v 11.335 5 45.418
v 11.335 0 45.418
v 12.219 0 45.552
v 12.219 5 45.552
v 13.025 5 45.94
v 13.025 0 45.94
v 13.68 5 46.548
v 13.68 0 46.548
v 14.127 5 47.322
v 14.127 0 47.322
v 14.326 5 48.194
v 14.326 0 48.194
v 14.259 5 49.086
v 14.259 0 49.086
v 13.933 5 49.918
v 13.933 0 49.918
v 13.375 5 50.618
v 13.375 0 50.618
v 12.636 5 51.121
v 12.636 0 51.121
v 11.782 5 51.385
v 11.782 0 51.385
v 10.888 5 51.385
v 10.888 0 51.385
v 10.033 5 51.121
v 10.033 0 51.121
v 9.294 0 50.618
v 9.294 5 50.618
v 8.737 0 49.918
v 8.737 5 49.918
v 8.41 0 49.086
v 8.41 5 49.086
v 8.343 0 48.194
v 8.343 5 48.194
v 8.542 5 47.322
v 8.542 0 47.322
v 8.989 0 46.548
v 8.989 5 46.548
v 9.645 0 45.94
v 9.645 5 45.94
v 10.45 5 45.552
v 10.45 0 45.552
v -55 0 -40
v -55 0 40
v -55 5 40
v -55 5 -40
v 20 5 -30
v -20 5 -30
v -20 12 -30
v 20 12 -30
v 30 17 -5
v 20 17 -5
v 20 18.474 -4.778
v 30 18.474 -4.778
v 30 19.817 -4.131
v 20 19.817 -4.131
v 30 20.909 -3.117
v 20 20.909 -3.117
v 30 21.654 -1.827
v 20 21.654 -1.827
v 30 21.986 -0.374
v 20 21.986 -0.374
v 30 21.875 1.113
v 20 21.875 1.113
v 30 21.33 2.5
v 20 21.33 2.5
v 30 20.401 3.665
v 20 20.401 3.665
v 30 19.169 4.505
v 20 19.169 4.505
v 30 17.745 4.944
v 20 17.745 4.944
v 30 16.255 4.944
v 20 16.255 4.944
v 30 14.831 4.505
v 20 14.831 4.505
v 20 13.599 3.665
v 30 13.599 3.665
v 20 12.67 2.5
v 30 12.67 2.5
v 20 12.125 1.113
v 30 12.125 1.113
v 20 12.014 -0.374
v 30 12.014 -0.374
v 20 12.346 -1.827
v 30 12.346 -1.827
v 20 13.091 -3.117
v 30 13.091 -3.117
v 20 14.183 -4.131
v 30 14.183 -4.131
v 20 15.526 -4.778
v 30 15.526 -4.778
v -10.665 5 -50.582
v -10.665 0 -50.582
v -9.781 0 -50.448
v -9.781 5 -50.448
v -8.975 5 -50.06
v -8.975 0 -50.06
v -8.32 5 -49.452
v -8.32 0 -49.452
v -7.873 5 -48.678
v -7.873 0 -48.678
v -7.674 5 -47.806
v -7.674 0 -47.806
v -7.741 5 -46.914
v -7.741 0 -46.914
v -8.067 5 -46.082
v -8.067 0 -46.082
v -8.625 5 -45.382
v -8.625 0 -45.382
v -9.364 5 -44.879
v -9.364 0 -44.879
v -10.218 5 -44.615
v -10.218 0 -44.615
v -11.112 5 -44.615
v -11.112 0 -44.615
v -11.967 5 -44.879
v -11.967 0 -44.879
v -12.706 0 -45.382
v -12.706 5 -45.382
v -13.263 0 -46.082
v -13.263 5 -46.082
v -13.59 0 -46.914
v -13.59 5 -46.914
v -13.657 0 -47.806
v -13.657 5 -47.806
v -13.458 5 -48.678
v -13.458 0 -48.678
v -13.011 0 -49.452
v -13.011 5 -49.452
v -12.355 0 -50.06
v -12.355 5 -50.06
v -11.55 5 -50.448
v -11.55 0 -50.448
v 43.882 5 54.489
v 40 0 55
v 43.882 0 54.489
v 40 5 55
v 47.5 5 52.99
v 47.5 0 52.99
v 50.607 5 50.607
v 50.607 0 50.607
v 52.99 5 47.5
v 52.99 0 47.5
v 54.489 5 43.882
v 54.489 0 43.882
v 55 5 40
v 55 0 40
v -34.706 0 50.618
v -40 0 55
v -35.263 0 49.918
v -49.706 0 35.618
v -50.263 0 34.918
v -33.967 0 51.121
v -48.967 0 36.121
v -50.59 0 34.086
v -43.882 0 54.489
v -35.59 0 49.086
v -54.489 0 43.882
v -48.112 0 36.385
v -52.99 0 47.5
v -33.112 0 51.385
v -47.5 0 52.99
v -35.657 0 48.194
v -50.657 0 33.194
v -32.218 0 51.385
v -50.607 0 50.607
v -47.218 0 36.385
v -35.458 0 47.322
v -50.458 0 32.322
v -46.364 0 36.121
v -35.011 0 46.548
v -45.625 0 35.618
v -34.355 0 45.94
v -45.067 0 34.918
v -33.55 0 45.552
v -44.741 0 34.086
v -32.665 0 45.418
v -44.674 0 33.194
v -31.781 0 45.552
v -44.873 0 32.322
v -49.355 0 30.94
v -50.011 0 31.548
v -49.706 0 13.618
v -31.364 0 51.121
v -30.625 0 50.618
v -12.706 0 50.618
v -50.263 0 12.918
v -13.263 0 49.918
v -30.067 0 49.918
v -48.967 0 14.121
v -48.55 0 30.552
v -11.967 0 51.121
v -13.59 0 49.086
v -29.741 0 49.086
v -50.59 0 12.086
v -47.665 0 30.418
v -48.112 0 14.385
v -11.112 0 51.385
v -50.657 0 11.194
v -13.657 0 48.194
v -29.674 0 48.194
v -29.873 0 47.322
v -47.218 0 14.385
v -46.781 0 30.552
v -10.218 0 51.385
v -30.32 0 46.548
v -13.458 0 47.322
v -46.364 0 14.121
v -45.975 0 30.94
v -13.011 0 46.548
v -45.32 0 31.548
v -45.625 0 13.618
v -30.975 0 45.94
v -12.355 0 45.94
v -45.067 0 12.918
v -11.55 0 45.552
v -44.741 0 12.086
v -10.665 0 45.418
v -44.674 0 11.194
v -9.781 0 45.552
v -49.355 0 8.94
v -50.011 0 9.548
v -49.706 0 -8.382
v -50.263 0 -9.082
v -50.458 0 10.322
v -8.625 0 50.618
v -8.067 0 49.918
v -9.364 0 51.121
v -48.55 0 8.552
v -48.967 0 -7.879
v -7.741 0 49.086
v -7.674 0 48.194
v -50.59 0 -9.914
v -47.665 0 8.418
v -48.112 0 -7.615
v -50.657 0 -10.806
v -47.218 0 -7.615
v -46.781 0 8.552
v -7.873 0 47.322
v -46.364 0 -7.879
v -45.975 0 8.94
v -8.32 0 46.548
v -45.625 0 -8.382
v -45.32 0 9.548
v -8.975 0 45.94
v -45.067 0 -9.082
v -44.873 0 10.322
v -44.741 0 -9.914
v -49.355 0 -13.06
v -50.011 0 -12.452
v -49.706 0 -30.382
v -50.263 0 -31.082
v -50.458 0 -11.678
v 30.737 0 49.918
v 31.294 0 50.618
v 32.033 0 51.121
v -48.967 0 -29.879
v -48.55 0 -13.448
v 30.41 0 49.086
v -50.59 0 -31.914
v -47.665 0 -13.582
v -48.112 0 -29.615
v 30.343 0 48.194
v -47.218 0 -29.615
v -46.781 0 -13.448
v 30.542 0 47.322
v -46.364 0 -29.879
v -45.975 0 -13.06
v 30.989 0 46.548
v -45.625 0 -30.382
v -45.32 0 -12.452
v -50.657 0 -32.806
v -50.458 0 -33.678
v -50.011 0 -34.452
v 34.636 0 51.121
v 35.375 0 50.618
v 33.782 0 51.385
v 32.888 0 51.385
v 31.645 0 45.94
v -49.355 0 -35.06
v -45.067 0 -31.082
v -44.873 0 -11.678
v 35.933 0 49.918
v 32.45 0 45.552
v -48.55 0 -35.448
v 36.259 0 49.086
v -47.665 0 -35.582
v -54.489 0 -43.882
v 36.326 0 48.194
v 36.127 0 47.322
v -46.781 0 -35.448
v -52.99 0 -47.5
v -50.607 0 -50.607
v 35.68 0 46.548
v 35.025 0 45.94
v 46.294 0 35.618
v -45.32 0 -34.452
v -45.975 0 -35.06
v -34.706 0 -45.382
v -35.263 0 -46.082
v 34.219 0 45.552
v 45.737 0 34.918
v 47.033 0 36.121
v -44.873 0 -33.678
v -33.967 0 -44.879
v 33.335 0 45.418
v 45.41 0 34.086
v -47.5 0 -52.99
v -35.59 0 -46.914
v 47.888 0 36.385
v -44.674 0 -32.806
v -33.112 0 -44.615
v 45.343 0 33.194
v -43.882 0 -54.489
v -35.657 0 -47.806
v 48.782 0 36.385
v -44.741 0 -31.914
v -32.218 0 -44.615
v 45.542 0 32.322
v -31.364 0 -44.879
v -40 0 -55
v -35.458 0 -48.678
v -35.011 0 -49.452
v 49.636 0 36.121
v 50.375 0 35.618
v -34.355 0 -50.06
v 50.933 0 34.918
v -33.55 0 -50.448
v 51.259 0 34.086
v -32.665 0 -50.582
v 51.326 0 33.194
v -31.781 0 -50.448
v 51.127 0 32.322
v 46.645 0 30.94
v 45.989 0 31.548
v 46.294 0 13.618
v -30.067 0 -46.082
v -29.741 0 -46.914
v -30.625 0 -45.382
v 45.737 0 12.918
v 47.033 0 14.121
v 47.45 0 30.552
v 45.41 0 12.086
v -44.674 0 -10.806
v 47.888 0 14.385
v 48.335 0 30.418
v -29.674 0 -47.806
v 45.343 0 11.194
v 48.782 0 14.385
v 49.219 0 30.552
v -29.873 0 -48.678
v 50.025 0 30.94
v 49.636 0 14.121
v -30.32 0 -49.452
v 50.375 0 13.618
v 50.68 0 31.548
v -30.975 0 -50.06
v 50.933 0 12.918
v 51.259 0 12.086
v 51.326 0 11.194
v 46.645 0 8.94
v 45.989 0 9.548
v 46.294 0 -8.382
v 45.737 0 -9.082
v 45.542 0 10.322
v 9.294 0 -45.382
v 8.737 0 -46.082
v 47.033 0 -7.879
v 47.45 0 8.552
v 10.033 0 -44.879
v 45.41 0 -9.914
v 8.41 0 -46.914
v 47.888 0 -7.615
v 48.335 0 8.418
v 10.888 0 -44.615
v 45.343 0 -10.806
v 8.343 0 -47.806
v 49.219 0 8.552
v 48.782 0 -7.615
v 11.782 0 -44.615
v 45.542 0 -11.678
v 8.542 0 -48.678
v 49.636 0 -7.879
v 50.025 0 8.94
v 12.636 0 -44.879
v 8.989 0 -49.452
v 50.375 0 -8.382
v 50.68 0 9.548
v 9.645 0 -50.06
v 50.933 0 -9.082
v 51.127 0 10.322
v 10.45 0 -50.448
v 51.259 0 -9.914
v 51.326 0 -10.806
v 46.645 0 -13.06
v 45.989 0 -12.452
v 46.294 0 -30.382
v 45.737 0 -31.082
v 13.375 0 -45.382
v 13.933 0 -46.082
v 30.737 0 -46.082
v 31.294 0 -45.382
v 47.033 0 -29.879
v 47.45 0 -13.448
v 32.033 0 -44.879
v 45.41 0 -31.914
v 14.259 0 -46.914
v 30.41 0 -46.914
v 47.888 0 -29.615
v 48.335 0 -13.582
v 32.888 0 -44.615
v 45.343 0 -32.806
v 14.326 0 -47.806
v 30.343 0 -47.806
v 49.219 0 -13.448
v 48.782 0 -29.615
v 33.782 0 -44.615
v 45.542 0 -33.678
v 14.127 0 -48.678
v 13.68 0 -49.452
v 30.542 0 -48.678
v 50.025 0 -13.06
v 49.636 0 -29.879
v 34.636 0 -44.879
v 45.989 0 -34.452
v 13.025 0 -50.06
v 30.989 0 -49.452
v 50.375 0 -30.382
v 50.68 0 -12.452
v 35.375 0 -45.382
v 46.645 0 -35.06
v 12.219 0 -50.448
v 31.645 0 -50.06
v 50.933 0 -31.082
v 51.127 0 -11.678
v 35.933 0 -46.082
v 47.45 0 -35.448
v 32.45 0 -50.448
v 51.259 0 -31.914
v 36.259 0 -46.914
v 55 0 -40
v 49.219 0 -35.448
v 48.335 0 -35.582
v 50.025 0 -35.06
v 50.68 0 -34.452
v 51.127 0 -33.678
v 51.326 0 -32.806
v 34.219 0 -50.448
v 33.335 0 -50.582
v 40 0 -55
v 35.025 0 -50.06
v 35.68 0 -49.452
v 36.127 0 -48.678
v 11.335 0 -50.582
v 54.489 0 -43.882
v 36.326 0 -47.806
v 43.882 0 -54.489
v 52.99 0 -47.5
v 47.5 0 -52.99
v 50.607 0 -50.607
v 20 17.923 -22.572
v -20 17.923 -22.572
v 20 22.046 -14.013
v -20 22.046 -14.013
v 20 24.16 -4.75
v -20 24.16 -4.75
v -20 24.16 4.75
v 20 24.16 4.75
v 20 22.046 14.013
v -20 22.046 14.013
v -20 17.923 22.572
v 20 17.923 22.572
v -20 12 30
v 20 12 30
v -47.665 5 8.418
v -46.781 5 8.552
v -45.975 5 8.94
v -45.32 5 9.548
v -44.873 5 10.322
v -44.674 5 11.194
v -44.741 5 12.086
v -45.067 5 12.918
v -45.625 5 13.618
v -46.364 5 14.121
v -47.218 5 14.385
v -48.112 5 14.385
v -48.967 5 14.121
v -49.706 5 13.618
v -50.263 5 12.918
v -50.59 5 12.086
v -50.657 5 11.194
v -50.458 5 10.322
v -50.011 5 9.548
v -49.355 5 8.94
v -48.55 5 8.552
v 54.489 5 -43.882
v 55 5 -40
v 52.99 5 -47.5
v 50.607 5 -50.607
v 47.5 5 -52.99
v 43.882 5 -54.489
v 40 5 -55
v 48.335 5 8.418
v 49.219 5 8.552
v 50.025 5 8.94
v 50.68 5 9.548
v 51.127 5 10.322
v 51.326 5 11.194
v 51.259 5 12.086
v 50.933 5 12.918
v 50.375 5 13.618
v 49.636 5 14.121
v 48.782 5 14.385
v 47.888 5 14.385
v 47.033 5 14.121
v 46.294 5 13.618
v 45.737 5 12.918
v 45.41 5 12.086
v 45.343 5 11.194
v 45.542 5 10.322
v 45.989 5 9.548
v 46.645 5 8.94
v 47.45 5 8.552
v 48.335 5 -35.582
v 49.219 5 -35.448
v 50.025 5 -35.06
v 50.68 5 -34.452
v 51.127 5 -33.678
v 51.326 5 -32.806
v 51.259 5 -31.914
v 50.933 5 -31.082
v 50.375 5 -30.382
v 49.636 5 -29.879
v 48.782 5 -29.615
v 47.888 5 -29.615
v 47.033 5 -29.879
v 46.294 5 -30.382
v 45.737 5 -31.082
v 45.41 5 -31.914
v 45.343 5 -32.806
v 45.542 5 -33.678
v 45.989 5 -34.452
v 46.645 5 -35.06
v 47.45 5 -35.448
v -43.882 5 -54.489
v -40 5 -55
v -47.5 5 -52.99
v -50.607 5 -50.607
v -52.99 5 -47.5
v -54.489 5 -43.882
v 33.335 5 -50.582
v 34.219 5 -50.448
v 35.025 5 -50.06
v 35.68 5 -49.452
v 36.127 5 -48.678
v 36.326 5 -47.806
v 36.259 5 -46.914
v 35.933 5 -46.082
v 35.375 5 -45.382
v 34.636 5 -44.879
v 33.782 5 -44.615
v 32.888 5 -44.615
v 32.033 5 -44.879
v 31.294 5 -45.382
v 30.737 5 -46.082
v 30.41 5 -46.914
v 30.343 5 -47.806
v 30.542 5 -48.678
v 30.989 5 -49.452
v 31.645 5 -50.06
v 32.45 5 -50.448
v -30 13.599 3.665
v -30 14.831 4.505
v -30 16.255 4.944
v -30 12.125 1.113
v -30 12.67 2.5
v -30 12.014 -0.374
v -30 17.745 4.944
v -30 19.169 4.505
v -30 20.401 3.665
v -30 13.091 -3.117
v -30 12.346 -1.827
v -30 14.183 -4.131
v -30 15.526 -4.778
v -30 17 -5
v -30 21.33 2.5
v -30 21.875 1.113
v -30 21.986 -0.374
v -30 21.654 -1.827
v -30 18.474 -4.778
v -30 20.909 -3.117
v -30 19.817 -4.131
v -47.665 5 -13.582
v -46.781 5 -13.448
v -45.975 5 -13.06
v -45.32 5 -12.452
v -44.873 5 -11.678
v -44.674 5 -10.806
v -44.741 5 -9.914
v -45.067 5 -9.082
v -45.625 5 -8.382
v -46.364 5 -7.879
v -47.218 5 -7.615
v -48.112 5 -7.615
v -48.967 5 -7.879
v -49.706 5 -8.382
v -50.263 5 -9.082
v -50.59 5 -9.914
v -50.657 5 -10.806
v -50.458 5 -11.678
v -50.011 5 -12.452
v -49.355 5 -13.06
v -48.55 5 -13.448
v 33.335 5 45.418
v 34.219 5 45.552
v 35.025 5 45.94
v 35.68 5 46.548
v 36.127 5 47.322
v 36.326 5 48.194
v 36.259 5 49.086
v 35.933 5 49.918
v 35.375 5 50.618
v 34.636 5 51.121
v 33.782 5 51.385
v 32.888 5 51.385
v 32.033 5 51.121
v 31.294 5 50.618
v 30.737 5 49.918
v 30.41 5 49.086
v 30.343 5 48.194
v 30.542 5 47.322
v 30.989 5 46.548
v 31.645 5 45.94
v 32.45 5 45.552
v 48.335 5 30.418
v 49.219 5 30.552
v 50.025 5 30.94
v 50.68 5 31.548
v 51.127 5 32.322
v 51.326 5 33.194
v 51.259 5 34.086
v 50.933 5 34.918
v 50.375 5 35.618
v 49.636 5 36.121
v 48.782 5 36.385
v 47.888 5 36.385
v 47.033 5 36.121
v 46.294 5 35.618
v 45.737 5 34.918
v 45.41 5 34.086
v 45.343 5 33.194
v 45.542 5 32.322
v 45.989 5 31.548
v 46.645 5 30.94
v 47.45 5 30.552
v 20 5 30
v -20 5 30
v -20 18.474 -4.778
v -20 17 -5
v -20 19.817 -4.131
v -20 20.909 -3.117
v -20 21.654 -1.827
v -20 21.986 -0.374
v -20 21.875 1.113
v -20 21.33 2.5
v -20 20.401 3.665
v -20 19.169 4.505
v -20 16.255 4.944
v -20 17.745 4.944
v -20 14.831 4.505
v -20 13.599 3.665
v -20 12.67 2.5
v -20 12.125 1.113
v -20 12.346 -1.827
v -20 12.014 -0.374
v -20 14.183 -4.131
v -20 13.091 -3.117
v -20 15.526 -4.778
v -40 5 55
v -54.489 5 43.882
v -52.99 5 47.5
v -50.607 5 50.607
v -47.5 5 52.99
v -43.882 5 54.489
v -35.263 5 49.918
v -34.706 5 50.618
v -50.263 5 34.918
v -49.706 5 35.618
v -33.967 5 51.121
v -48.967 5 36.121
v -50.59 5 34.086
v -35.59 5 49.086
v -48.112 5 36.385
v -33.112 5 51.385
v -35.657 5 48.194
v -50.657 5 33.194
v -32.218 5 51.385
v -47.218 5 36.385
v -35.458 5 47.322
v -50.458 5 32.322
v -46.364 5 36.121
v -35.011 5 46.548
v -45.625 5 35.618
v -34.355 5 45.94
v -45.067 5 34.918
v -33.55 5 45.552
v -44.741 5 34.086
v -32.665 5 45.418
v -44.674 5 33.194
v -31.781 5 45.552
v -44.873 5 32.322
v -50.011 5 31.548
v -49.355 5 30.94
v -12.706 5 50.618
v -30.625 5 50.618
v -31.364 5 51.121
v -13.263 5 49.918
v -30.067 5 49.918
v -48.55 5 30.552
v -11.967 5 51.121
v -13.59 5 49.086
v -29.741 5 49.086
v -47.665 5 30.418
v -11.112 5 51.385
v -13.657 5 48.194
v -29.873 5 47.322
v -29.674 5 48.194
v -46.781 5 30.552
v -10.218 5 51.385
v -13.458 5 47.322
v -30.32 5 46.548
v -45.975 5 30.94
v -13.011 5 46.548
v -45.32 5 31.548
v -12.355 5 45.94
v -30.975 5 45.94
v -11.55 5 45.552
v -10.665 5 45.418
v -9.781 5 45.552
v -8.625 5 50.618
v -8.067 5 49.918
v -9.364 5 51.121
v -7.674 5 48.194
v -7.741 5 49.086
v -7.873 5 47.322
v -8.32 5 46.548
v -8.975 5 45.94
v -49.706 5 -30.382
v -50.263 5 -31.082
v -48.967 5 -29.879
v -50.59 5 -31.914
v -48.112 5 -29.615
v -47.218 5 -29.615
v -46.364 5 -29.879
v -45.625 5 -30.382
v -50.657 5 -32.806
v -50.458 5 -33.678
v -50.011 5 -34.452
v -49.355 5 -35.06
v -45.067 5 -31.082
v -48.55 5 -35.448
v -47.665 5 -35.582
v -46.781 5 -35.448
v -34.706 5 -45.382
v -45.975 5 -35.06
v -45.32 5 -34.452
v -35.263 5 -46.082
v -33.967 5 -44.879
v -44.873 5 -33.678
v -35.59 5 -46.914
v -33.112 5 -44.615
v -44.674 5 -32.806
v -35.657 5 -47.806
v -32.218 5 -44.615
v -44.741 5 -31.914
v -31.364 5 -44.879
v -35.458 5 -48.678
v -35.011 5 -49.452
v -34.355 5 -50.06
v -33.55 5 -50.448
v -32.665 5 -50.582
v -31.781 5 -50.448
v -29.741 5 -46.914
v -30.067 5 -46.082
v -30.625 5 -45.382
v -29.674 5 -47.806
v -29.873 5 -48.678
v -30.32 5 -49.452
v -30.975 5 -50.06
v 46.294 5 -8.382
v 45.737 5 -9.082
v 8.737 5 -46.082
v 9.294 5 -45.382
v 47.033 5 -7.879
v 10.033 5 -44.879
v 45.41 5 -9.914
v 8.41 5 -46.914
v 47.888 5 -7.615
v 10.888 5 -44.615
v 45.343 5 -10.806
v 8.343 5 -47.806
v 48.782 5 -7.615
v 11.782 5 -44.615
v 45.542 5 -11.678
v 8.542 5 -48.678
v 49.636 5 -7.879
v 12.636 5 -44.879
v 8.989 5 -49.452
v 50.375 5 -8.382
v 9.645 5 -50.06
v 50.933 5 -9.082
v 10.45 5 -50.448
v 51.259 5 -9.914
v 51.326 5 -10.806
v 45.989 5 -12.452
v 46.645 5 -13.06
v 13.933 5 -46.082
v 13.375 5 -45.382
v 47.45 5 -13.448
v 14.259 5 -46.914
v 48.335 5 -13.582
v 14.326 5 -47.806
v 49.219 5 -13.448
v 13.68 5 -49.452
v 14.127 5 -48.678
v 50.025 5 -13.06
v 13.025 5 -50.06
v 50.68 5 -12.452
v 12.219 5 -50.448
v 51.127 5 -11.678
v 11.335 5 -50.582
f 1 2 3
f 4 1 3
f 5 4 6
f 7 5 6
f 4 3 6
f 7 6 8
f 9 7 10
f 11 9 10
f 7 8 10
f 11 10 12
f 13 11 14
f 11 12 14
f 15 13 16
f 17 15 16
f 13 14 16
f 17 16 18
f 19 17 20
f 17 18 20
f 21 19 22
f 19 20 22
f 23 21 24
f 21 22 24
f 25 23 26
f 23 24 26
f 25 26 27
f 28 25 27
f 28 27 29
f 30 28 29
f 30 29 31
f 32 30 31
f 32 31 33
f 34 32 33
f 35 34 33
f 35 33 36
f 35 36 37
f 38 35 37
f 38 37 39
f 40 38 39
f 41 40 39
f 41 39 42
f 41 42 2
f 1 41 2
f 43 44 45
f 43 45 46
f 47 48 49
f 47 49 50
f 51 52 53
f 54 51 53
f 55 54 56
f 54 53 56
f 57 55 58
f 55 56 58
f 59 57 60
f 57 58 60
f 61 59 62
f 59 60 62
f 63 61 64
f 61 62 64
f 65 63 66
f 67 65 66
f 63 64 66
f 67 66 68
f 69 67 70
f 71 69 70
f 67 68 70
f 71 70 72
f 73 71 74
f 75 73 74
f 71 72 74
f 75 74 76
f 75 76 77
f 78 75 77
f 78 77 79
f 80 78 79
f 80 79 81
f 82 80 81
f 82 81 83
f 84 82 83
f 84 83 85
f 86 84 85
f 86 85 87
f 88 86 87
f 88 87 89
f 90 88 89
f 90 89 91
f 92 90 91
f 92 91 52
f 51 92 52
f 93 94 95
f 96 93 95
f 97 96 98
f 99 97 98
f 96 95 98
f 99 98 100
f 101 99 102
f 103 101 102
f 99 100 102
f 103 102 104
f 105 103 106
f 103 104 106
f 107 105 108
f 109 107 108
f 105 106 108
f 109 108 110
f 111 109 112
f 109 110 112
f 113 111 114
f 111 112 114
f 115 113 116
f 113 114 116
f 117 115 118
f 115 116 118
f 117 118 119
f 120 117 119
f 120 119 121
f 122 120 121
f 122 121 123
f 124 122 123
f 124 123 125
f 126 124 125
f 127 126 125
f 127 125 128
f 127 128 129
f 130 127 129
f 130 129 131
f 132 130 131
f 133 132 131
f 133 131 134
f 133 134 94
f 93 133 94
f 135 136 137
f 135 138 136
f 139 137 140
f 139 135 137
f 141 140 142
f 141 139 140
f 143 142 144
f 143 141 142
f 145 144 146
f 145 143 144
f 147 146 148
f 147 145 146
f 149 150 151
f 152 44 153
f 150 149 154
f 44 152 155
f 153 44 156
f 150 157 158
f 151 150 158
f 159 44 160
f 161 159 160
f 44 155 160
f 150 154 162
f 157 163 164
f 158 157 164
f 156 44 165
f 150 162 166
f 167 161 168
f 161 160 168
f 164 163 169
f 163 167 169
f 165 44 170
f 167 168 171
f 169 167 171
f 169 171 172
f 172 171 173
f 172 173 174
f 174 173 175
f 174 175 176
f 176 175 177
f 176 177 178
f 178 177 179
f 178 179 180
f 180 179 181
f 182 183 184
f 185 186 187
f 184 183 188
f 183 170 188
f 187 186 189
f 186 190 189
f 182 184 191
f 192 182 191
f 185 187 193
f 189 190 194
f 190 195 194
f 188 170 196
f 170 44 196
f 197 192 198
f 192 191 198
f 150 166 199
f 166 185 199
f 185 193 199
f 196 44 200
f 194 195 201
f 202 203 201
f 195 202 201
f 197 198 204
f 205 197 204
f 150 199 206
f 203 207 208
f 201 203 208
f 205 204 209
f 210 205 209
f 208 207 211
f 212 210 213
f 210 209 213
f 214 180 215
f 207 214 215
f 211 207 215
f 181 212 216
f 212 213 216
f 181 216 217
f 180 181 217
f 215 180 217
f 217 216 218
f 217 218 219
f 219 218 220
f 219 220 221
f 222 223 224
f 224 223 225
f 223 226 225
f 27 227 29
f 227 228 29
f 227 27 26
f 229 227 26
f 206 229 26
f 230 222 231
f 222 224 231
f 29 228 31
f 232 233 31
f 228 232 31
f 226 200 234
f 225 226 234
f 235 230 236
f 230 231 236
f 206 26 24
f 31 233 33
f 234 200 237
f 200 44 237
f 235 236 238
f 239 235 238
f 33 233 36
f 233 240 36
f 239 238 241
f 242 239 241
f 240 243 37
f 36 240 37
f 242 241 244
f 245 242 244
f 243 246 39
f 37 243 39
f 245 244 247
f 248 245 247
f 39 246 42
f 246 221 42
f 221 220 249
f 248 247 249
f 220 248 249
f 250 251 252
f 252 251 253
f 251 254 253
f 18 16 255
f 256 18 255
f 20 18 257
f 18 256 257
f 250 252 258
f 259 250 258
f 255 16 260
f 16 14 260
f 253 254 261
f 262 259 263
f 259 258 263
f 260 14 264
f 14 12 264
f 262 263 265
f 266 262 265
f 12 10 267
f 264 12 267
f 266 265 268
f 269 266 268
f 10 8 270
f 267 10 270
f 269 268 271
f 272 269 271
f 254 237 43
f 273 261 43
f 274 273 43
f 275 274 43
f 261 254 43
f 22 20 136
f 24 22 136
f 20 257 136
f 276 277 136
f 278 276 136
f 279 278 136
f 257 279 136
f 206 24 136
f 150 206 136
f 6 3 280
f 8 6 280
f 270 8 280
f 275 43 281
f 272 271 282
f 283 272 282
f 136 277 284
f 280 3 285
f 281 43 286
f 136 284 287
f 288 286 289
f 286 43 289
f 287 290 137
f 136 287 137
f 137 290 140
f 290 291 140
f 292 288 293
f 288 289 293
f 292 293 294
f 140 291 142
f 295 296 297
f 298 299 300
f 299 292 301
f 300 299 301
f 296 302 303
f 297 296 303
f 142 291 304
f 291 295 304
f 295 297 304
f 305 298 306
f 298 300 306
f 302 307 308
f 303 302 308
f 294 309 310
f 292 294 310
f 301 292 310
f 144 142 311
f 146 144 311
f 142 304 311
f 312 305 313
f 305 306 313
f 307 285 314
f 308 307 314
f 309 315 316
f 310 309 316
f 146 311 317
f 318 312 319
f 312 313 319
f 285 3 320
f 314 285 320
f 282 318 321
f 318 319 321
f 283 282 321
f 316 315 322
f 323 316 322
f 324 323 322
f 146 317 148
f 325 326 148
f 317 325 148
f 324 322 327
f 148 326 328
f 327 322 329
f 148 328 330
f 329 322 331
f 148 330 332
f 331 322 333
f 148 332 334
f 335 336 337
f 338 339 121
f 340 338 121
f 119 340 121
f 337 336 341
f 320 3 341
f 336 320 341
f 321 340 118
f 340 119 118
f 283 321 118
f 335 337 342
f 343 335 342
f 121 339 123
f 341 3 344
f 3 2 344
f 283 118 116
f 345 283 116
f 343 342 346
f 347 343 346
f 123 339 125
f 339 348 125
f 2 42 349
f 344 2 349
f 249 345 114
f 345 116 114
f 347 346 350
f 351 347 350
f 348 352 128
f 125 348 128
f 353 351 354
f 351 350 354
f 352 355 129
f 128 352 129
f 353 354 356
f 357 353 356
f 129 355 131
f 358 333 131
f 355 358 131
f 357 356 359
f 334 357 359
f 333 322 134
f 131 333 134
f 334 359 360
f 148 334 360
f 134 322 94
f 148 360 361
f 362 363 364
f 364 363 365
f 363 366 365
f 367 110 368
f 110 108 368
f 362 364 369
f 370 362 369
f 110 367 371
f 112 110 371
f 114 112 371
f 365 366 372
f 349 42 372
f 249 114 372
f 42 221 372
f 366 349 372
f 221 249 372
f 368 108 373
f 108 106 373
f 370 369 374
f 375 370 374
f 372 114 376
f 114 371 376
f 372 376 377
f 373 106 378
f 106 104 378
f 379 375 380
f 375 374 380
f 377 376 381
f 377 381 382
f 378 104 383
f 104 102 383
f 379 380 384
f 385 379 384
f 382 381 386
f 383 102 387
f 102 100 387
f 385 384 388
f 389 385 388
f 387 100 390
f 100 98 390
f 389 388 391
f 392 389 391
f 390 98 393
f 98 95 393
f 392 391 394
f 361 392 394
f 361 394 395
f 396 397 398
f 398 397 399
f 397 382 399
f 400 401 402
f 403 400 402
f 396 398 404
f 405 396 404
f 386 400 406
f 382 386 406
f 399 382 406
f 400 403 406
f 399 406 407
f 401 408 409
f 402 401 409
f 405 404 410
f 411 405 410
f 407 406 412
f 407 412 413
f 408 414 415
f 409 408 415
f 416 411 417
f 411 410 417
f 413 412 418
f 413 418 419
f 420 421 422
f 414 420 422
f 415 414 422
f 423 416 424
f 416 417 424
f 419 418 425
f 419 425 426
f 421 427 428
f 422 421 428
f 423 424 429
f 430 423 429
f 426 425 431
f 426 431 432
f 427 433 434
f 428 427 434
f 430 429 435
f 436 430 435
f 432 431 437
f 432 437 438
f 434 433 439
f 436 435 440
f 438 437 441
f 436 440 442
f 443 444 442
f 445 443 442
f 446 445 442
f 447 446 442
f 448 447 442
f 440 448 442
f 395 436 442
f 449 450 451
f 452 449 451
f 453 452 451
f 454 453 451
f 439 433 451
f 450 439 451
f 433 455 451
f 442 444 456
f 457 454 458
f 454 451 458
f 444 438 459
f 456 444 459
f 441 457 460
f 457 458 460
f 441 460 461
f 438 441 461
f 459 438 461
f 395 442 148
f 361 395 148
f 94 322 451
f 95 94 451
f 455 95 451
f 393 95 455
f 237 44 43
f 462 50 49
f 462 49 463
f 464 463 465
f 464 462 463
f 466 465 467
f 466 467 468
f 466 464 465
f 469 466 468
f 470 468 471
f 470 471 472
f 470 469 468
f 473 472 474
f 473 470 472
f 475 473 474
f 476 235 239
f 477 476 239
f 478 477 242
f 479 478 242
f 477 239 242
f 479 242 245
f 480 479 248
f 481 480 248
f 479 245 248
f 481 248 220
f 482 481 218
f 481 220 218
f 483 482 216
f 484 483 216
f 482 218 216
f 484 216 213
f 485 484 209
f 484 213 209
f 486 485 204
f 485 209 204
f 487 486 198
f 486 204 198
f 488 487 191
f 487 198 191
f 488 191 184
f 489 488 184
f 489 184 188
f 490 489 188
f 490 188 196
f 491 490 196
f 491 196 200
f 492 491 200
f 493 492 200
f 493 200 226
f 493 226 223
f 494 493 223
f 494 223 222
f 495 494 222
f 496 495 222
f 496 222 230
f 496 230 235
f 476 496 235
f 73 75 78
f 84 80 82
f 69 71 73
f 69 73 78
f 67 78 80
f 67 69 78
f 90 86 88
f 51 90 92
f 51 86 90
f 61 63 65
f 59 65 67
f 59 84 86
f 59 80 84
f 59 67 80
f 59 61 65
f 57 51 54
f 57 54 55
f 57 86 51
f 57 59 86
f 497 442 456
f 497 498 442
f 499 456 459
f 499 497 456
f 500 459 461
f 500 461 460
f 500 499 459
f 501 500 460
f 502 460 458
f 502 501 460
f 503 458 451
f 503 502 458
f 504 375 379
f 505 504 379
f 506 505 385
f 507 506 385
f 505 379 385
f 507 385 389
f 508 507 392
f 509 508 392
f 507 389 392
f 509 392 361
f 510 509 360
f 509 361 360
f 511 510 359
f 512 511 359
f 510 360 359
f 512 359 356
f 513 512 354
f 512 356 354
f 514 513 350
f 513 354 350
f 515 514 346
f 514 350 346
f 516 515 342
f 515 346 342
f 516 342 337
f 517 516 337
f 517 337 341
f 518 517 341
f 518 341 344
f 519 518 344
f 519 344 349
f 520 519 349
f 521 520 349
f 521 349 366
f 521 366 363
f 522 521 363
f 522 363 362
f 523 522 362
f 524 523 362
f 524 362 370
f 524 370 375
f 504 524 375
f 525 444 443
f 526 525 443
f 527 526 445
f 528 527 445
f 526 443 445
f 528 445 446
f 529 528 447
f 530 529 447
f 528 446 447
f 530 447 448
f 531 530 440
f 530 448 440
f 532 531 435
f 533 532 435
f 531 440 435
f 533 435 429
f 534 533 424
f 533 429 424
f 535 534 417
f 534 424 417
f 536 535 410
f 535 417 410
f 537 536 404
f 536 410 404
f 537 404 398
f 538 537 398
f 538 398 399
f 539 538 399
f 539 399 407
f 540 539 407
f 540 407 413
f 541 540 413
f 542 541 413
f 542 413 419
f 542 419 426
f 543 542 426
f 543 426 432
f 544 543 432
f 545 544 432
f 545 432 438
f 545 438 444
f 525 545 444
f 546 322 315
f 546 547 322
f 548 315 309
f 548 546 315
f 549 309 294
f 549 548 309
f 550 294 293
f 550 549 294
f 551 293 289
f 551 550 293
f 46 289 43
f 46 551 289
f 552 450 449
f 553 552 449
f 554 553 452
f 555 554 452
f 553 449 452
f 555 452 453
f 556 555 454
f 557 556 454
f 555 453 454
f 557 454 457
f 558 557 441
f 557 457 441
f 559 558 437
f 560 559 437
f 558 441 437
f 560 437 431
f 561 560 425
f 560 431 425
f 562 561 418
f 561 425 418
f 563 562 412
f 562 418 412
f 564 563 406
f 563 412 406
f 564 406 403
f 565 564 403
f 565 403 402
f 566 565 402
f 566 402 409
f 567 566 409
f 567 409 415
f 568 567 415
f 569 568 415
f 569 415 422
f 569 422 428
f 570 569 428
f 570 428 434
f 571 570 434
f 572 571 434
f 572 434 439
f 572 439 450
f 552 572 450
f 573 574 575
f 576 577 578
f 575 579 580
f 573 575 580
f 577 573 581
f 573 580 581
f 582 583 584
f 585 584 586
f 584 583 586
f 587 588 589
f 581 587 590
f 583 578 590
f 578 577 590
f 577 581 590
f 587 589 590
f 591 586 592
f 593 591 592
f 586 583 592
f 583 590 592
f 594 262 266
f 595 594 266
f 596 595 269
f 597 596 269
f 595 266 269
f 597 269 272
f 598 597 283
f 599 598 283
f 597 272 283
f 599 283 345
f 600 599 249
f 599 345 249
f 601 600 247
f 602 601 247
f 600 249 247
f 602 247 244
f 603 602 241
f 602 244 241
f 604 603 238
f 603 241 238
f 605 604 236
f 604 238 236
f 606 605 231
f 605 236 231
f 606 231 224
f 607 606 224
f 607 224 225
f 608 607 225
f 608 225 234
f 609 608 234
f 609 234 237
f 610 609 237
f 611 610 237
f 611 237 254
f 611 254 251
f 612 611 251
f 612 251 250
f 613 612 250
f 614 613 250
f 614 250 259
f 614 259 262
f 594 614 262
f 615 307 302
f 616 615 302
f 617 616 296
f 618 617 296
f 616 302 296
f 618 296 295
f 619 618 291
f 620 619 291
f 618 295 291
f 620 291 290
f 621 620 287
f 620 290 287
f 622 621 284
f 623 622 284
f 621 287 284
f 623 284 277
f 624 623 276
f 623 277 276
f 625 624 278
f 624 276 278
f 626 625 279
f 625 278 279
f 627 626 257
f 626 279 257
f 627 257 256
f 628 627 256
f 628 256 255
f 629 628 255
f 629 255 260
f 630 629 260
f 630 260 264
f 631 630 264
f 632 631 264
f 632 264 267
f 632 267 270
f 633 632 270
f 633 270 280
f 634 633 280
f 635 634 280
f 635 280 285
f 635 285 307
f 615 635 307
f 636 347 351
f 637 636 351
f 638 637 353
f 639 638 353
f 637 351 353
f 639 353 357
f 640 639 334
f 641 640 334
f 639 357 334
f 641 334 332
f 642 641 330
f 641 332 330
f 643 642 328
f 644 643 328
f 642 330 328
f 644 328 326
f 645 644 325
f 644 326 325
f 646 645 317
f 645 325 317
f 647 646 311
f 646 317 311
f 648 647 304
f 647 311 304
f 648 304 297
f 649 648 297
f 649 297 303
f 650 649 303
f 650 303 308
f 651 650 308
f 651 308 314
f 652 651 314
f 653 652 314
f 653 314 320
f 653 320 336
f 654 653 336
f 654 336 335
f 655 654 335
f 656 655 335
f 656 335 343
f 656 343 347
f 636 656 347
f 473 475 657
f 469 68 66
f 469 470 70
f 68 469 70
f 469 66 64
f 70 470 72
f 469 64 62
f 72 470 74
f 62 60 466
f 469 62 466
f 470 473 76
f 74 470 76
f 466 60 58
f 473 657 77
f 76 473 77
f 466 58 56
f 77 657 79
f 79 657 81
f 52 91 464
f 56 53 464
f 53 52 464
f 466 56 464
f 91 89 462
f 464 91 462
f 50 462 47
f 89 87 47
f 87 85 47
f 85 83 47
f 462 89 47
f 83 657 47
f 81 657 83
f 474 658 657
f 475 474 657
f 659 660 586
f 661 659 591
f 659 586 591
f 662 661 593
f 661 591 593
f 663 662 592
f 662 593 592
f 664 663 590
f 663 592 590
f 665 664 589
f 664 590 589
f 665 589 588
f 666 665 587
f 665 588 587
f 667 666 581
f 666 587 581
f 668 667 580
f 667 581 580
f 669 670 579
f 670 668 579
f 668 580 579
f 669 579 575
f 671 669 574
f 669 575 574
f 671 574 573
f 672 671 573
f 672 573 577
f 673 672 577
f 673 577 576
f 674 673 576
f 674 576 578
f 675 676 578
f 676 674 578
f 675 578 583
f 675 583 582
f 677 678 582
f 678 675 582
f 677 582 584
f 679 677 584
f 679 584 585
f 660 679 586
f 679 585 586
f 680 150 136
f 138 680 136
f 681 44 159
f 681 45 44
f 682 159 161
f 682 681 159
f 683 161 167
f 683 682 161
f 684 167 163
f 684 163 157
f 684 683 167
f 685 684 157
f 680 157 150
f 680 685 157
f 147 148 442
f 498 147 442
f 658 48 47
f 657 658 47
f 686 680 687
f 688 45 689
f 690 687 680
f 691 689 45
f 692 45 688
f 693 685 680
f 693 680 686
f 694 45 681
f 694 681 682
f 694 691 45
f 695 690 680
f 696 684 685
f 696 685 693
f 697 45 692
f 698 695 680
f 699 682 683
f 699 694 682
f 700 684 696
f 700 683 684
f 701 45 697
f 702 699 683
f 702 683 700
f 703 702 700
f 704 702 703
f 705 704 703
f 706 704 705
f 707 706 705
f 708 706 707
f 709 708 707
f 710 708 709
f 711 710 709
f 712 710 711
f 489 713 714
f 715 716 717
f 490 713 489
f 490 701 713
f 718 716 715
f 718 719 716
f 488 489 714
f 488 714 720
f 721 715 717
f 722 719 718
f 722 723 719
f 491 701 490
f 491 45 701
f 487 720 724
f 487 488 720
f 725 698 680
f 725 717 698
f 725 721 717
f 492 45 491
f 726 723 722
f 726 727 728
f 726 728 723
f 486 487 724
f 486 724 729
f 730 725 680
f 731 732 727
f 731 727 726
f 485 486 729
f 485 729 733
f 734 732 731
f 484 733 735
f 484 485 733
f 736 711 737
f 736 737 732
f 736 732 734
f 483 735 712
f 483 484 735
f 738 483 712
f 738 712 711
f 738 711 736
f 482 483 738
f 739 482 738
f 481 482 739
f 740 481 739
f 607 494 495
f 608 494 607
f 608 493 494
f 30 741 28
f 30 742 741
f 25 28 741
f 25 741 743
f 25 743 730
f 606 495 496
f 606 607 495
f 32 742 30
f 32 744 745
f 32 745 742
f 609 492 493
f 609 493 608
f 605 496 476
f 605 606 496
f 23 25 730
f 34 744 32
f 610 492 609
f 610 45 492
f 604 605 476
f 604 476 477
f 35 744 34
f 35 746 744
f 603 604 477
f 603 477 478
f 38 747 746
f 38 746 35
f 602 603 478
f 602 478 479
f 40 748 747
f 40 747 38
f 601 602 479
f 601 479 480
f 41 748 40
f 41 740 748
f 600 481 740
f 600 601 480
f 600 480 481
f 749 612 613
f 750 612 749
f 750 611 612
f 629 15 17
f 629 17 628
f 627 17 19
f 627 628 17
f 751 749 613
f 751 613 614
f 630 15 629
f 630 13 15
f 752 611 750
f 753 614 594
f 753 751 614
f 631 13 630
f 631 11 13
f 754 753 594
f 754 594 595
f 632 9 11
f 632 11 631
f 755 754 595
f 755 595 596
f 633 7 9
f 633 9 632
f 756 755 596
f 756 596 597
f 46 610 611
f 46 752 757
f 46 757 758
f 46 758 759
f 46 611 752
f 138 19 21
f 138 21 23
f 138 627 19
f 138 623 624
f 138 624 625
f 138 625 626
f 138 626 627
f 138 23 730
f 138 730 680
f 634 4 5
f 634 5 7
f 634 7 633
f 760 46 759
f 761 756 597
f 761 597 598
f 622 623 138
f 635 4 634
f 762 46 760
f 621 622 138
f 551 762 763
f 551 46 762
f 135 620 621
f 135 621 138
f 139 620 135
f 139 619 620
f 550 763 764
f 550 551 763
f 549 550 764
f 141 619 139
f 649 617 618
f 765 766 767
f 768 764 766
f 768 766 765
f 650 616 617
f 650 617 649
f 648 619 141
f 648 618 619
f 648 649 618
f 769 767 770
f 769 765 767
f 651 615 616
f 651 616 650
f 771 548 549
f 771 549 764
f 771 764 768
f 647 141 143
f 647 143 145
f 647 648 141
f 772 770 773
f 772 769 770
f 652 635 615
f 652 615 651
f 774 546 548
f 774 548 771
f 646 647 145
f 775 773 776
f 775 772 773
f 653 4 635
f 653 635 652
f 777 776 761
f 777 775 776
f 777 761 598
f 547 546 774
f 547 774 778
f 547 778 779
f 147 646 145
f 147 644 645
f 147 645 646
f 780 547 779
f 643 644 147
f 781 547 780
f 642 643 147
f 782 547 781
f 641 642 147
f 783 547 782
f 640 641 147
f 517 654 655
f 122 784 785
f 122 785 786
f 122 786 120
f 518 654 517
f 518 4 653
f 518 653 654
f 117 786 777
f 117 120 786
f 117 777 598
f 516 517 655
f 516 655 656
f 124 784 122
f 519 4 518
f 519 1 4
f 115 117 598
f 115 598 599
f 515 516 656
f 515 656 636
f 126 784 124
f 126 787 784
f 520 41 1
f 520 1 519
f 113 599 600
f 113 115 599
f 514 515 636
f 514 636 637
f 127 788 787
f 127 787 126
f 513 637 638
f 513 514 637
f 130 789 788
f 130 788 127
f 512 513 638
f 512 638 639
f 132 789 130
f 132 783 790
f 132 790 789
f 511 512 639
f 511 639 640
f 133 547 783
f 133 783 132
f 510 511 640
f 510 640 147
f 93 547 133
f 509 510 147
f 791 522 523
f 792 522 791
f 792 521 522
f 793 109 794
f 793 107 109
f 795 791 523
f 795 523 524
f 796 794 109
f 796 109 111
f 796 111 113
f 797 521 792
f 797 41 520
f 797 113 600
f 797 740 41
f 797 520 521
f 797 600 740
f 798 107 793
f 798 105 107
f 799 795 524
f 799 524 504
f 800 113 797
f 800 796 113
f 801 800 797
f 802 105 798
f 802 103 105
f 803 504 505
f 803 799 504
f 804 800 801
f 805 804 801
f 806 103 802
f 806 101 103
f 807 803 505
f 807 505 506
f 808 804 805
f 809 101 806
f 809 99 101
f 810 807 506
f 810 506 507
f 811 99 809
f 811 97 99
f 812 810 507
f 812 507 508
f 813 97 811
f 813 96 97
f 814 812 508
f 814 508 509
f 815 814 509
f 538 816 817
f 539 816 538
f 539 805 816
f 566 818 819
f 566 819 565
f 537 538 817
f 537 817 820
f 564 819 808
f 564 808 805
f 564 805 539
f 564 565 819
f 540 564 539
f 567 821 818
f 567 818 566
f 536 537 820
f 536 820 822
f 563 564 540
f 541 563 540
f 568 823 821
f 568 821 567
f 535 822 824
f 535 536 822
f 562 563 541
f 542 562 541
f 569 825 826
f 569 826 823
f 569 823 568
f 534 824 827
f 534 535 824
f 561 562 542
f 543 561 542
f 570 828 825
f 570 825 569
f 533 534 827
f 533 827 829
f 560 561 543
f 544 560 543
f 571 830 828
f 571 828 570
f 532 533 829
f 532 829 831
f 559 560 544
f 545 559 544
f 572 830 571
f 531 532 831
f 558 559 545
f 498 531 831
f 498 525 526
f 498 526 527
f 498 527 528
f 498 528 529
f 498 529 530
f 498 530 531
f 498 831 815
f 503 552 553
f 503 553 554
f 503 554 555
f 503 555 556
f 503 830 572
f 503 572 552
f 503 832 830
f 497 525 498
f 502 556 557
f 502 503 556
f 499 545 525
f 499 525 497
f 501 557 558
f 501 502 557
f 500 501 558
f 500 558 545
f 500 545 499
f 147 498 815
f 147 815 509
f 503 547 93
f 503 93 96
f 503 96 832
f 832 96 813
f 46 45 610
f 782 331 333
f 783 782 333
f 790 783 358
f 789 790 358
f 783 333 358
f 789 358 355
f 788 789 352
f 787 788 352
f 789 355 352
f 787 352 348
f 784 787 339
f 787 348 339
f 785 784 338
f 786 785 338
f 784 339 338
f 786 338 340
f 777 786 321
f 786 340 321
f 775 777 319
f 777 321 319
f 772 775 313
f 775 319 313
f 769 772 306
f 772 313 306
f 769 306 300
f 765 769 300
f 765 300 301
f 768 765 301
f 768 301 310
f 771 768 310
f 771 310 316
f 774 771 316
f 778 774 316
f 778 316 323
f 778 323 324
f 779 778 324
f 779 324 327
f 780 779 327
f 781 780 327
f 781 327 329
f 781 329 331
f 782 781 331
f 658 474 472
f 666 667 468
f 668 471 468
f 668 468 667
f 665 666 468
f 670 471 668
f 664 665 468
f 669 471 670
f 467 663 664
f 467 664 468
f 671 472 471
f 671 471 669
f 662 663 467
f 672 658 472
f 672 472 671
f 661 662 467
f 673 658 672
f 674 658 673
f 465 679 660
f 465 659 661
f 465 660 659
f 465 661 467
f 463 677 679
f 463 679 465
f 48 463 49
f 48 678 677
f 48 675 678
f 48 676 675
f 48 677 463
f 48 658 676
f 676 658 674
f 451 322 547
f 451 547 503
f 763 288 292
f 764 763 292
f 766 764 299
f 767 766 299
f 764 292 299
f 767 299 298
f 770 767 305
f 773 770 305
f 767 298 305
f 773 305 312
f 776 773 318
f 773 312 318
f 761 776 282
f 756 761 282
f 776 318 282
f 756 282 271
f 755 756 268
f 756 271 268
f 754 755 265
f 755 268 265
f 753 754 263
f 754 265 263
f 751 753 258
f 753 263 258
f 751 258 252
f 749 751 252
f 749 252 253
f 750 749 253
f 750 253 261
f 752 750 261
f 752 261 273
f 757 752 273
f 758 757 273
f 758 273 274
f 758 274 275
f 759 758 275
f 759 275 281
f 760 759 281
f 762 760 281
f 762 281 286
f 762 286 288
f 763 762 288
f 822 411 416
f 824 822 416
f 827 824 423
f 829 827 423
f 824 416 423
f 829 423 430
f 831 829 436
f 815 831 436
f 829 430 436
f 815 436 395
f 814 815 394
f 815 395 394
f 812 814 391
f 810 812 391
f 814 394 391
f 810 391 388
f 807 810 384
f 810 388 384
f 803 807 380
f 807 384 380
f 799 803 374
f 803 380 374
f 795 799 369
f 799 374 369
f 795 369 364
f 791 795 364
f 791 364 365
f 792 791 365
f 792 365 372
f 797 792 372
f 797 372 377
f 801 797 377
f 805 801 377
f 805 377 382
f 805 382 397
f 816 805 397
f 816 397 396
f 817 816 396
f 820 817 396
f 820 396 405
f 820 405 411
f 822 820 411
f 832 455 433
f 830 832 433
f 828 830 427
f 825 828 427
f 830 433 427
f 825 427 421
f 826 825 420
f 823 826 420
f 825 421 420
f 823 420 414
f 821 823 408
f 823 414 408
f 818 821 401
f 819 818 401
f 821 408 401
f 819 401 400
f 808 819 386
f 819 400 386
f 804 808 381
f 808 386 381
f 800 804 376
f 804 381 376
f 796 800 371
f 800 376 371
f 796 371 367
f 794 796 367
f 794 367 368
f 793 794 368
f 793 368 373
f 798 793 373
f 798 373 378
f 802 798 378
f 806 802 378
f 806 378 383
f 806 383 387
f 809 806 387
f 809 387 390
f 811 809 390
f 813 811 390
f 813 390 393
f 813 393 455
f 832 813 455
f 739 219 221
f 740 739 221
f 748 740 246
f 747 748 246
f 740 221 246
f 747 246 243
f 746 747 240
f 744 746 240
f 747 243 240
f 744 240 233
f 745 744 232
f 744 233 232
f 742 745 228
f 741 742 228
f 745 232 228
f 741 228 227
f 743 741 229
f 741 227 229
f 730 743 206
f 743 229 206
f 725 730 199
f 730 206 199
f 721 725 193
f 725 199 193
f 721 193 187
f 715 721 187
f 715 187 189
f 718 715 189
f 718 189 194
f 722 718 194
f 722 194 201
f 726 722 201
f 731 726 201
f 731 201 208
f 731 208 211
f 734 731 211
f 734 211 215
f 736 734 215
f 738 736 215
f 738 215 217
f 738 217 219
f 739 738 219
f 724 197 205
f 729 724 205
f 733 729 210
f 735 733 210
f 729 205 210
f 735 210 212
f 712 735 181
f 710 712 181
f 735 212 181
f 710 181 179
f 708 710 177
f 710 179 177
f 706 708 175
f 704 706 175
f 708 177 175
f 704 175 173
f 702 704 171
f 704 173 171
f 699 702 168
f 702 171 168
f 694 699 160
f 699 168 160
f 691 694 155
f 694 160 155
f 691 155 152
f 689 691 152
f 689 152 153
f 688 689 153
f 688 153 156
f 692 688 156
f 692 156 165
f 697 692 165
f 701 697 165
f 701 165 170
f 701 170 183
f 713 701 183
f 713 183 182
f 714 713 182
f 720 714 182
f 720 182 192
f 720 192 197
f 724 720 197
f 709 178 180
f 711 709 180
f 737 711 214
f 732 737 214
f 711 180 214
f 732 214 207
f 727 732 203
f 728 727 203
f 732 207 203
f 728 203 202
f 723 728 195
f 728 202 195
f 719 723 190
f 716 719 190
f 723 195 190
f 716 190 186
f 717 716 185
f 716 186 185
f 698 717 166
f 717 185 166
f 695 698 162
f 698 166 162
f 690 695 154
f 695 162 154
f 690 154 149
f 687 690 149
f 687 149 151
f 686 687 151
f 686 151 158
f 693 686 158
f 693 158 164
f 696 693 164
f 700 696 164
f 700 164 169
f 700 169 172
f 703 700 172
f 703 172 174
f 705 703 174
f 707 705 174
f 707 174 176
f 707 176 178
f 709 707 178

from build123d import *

# Parameters (mm, degrees)
SKETCH1_W                = 110
SKETCH1_H                = 110
BOSS_EXTRUDE1_DEPTH      = 5
FILLET2_R                = 15
FILLET3_R                = 15
FILLET4_R                = 15
FILLET5_R                = 15
SKETCH2_W                = 40
SKETCH2_H                = 60
BOSS_EXTRUDE2_DEPTH      = 24
BOSS_EXTRUDE3_DEPTH      = 10
BOSS_EXTRUDE3_DEPTH_BACK = 50
SKETCH4_R                = 5
FILLET6_R                = 10
FILLET7_R                = 10
SKETCH5_R                = 3
CUT_EXTRUDE1_DEPTH       = 10
CUT_EXTRUDE2_DEPTH       = 60


with BuildPart() as part:
    # Sketch1 → Boss-Extrude1 (new body)
    with BuildSketch(Plane(origin=(0, 0, 0), x_dir=(1, 0, 0), z_dir=(0, 1, 0))):
        Rectangle(SKETCH1_W, SKETCH1_H)
    extrude(amount=BOSS_EXTRUDE1_DEPTH)

    # Fillet2
    fillet2_edges = [part.edges().sort_by_distance(p)[0] for p in [
        (55, 2.5, -55),
    ]]
    fillet(fillet2_edges, radius=FILLET2_R)

    # Fillet3
    fillet3_edges = [part.edges().sort_by_distance(p)[0] for p in [
        (-55, 2.5, -55),
    ]]
    fillet(fillet3_edges, radius=FILLET3_R)

    # Fillet4
    fillet4_edges = [part.edges().sort_by_distance(p)[0] for p in [
        (-55, 2.5, 55),
    ]]
    fillet(fillet4_edges, radius=FILLET4_R)

    # Fillet5
    fillet5_edges = [part.edges().sort_by_distance(p)[0] for p in [
        (55, 2.5, 55),
    ]]
    fillet(fillet5_edges, radius=FILLET5_R)

    # Sketch2 → Boss-Extrude2 (add)
    with BuildSketch(Plane(origin=(0, 5, 0), x_dir=(1, 0, 0), z_dir=(0, 1, 0))):
        Rectangle(SKETCH2_W, SKETCH2_H)
    extrude(amount=BOSS_EXTRUDE2_DEPTH)

    # Sketch4 → Boss-Extrude3 (add, two sides: drawn at the far end of the back side and taken through both)
    with BuildSketch(Plane(origin=(20, 0, 0), x_dir=(0, 0, -1), z_dir=(1, 0, 0)).offset(-BOSS_EXTRUDE3_DEPTH_BACK)):
        with Locations((0, 17)):
            Circle(SKETCH4_R)
    extrude(amount=BOSS_EXTRUDE3_DEPTH + BOSS_EXTRUDE3_DEPTH_BACK)

    # Fillet6
    fillet6_edges = [part.edges().sort_by_distance(p)[0] for p in [
        (0, 29, 30),
    ]]
    fillet(fillet6_edges, radius=FILLET6_R)

    # Fillet7
    fillet7_edges = [part.edges().sort_by_distance(p)[0] for p in [
        (0, 29, -30),
    ]]
    fillet(fillet7_edges, radius=FILLET7_R)

    # Sketch5 → Cut-Extrude1 (cut)
    with BuildSketch(Plane.XZ):
        with Locations((48.334696306, -10.581629618)):
            Circle(SKETCH5_R)
        with Locations((48.334696306, 33.418370382)):
            Circle(SKETCH5_R)
        with Locations((-47.665303694, 11.418370382)):
            Circle(SKETCH5_R)
        with Locations((-47.665303694, -10.581629618)):
            Circle(SKETCH5_R)
        with Locations((-47.665303694, -32.581629618)):
            Circle(SKETCH5_R)
        with Locations((-32.665303694, -47.581629618)):
            Circle(SKETCH5_R)
        with Locations((-10.665303694, -47.581629618)):
            Circle(SKETCH5_R)
        with Locations((11.334696306, -47.581629618)):
            Circle(SKETCH5_R)
        with Locations((33.334696306, -47.581629618)):
            Circle(SKETCH5_R)
        with Locations((48.334696306, -32.581629618)):
            Circle(SKETCH5_R)
        with Locations((48.334696306, 11.418370382)):
            Circle(SKETCH5_R)
        with Locations((33.334696306, 48.418370382)):
            Circle(SKETCH5_R)
        with Locations((11.334696306, 48.418370382)):
            Circle(SKETCH5_R)
        with Locations((-10.665303694, 48.418370382)):
            Circle(SKETCH5_R)
        with Locations((-32.665303694, 48.418370382)):
            Circle(SKETCH5_R)
        with Locations((-47.665303694, 33.418370382)):
            Circle(SKETCH5_R)
    extrude(amount=-CUT_EXTRUDE1_DEPTH, mode=Mode.SUBTRACT)

    # Sketch6 → Cut-Extrude2 (cut)
    with BuildSketch(Plane(origin=(20, 0, 0), x_dir=(0, 0, -1), z_dir=(1, 0, 0))):
        with BuildLine():
            Line((30, 19), (30, 12))
            ThreePointArc((30, 12), (0, 24.426406871), (-30, 12))
            Line((-30, 12), (-30, 19))
            ThreePointArc((-30, 19), (-27.071067812, 26.071067812), (-20, 29))
            Line((-20, 29), (20, 29))
            ThreePointArc((20, 29), (27.071067812, 26.071067812), (30, 19))
        make_face()
    extrude(amount=-CUT_EXTRUDE2_DEPTH, mode=Mode.SUBTRACT)


with BuildPart() as body_2:
    # Split1: the piece on the far side of the plane
    add(part.part)
    split(bisect_by=Plane(origin=(0, 5, 0), x_dir=(0, 0, -1), z_dir=(0, -1, 0)), keep=Keep.BOTTOM)


with BuildPart() as part_1:
    add(part.part)

    # Split1
    split(bisect_by=Plane(origin=(0, 5, 0), x_dir=(0, 0, -1), z_dir=(0, -1, 0)), keep=Keep.TOP)


solid = Compound([body_2.part, part_1.part])
